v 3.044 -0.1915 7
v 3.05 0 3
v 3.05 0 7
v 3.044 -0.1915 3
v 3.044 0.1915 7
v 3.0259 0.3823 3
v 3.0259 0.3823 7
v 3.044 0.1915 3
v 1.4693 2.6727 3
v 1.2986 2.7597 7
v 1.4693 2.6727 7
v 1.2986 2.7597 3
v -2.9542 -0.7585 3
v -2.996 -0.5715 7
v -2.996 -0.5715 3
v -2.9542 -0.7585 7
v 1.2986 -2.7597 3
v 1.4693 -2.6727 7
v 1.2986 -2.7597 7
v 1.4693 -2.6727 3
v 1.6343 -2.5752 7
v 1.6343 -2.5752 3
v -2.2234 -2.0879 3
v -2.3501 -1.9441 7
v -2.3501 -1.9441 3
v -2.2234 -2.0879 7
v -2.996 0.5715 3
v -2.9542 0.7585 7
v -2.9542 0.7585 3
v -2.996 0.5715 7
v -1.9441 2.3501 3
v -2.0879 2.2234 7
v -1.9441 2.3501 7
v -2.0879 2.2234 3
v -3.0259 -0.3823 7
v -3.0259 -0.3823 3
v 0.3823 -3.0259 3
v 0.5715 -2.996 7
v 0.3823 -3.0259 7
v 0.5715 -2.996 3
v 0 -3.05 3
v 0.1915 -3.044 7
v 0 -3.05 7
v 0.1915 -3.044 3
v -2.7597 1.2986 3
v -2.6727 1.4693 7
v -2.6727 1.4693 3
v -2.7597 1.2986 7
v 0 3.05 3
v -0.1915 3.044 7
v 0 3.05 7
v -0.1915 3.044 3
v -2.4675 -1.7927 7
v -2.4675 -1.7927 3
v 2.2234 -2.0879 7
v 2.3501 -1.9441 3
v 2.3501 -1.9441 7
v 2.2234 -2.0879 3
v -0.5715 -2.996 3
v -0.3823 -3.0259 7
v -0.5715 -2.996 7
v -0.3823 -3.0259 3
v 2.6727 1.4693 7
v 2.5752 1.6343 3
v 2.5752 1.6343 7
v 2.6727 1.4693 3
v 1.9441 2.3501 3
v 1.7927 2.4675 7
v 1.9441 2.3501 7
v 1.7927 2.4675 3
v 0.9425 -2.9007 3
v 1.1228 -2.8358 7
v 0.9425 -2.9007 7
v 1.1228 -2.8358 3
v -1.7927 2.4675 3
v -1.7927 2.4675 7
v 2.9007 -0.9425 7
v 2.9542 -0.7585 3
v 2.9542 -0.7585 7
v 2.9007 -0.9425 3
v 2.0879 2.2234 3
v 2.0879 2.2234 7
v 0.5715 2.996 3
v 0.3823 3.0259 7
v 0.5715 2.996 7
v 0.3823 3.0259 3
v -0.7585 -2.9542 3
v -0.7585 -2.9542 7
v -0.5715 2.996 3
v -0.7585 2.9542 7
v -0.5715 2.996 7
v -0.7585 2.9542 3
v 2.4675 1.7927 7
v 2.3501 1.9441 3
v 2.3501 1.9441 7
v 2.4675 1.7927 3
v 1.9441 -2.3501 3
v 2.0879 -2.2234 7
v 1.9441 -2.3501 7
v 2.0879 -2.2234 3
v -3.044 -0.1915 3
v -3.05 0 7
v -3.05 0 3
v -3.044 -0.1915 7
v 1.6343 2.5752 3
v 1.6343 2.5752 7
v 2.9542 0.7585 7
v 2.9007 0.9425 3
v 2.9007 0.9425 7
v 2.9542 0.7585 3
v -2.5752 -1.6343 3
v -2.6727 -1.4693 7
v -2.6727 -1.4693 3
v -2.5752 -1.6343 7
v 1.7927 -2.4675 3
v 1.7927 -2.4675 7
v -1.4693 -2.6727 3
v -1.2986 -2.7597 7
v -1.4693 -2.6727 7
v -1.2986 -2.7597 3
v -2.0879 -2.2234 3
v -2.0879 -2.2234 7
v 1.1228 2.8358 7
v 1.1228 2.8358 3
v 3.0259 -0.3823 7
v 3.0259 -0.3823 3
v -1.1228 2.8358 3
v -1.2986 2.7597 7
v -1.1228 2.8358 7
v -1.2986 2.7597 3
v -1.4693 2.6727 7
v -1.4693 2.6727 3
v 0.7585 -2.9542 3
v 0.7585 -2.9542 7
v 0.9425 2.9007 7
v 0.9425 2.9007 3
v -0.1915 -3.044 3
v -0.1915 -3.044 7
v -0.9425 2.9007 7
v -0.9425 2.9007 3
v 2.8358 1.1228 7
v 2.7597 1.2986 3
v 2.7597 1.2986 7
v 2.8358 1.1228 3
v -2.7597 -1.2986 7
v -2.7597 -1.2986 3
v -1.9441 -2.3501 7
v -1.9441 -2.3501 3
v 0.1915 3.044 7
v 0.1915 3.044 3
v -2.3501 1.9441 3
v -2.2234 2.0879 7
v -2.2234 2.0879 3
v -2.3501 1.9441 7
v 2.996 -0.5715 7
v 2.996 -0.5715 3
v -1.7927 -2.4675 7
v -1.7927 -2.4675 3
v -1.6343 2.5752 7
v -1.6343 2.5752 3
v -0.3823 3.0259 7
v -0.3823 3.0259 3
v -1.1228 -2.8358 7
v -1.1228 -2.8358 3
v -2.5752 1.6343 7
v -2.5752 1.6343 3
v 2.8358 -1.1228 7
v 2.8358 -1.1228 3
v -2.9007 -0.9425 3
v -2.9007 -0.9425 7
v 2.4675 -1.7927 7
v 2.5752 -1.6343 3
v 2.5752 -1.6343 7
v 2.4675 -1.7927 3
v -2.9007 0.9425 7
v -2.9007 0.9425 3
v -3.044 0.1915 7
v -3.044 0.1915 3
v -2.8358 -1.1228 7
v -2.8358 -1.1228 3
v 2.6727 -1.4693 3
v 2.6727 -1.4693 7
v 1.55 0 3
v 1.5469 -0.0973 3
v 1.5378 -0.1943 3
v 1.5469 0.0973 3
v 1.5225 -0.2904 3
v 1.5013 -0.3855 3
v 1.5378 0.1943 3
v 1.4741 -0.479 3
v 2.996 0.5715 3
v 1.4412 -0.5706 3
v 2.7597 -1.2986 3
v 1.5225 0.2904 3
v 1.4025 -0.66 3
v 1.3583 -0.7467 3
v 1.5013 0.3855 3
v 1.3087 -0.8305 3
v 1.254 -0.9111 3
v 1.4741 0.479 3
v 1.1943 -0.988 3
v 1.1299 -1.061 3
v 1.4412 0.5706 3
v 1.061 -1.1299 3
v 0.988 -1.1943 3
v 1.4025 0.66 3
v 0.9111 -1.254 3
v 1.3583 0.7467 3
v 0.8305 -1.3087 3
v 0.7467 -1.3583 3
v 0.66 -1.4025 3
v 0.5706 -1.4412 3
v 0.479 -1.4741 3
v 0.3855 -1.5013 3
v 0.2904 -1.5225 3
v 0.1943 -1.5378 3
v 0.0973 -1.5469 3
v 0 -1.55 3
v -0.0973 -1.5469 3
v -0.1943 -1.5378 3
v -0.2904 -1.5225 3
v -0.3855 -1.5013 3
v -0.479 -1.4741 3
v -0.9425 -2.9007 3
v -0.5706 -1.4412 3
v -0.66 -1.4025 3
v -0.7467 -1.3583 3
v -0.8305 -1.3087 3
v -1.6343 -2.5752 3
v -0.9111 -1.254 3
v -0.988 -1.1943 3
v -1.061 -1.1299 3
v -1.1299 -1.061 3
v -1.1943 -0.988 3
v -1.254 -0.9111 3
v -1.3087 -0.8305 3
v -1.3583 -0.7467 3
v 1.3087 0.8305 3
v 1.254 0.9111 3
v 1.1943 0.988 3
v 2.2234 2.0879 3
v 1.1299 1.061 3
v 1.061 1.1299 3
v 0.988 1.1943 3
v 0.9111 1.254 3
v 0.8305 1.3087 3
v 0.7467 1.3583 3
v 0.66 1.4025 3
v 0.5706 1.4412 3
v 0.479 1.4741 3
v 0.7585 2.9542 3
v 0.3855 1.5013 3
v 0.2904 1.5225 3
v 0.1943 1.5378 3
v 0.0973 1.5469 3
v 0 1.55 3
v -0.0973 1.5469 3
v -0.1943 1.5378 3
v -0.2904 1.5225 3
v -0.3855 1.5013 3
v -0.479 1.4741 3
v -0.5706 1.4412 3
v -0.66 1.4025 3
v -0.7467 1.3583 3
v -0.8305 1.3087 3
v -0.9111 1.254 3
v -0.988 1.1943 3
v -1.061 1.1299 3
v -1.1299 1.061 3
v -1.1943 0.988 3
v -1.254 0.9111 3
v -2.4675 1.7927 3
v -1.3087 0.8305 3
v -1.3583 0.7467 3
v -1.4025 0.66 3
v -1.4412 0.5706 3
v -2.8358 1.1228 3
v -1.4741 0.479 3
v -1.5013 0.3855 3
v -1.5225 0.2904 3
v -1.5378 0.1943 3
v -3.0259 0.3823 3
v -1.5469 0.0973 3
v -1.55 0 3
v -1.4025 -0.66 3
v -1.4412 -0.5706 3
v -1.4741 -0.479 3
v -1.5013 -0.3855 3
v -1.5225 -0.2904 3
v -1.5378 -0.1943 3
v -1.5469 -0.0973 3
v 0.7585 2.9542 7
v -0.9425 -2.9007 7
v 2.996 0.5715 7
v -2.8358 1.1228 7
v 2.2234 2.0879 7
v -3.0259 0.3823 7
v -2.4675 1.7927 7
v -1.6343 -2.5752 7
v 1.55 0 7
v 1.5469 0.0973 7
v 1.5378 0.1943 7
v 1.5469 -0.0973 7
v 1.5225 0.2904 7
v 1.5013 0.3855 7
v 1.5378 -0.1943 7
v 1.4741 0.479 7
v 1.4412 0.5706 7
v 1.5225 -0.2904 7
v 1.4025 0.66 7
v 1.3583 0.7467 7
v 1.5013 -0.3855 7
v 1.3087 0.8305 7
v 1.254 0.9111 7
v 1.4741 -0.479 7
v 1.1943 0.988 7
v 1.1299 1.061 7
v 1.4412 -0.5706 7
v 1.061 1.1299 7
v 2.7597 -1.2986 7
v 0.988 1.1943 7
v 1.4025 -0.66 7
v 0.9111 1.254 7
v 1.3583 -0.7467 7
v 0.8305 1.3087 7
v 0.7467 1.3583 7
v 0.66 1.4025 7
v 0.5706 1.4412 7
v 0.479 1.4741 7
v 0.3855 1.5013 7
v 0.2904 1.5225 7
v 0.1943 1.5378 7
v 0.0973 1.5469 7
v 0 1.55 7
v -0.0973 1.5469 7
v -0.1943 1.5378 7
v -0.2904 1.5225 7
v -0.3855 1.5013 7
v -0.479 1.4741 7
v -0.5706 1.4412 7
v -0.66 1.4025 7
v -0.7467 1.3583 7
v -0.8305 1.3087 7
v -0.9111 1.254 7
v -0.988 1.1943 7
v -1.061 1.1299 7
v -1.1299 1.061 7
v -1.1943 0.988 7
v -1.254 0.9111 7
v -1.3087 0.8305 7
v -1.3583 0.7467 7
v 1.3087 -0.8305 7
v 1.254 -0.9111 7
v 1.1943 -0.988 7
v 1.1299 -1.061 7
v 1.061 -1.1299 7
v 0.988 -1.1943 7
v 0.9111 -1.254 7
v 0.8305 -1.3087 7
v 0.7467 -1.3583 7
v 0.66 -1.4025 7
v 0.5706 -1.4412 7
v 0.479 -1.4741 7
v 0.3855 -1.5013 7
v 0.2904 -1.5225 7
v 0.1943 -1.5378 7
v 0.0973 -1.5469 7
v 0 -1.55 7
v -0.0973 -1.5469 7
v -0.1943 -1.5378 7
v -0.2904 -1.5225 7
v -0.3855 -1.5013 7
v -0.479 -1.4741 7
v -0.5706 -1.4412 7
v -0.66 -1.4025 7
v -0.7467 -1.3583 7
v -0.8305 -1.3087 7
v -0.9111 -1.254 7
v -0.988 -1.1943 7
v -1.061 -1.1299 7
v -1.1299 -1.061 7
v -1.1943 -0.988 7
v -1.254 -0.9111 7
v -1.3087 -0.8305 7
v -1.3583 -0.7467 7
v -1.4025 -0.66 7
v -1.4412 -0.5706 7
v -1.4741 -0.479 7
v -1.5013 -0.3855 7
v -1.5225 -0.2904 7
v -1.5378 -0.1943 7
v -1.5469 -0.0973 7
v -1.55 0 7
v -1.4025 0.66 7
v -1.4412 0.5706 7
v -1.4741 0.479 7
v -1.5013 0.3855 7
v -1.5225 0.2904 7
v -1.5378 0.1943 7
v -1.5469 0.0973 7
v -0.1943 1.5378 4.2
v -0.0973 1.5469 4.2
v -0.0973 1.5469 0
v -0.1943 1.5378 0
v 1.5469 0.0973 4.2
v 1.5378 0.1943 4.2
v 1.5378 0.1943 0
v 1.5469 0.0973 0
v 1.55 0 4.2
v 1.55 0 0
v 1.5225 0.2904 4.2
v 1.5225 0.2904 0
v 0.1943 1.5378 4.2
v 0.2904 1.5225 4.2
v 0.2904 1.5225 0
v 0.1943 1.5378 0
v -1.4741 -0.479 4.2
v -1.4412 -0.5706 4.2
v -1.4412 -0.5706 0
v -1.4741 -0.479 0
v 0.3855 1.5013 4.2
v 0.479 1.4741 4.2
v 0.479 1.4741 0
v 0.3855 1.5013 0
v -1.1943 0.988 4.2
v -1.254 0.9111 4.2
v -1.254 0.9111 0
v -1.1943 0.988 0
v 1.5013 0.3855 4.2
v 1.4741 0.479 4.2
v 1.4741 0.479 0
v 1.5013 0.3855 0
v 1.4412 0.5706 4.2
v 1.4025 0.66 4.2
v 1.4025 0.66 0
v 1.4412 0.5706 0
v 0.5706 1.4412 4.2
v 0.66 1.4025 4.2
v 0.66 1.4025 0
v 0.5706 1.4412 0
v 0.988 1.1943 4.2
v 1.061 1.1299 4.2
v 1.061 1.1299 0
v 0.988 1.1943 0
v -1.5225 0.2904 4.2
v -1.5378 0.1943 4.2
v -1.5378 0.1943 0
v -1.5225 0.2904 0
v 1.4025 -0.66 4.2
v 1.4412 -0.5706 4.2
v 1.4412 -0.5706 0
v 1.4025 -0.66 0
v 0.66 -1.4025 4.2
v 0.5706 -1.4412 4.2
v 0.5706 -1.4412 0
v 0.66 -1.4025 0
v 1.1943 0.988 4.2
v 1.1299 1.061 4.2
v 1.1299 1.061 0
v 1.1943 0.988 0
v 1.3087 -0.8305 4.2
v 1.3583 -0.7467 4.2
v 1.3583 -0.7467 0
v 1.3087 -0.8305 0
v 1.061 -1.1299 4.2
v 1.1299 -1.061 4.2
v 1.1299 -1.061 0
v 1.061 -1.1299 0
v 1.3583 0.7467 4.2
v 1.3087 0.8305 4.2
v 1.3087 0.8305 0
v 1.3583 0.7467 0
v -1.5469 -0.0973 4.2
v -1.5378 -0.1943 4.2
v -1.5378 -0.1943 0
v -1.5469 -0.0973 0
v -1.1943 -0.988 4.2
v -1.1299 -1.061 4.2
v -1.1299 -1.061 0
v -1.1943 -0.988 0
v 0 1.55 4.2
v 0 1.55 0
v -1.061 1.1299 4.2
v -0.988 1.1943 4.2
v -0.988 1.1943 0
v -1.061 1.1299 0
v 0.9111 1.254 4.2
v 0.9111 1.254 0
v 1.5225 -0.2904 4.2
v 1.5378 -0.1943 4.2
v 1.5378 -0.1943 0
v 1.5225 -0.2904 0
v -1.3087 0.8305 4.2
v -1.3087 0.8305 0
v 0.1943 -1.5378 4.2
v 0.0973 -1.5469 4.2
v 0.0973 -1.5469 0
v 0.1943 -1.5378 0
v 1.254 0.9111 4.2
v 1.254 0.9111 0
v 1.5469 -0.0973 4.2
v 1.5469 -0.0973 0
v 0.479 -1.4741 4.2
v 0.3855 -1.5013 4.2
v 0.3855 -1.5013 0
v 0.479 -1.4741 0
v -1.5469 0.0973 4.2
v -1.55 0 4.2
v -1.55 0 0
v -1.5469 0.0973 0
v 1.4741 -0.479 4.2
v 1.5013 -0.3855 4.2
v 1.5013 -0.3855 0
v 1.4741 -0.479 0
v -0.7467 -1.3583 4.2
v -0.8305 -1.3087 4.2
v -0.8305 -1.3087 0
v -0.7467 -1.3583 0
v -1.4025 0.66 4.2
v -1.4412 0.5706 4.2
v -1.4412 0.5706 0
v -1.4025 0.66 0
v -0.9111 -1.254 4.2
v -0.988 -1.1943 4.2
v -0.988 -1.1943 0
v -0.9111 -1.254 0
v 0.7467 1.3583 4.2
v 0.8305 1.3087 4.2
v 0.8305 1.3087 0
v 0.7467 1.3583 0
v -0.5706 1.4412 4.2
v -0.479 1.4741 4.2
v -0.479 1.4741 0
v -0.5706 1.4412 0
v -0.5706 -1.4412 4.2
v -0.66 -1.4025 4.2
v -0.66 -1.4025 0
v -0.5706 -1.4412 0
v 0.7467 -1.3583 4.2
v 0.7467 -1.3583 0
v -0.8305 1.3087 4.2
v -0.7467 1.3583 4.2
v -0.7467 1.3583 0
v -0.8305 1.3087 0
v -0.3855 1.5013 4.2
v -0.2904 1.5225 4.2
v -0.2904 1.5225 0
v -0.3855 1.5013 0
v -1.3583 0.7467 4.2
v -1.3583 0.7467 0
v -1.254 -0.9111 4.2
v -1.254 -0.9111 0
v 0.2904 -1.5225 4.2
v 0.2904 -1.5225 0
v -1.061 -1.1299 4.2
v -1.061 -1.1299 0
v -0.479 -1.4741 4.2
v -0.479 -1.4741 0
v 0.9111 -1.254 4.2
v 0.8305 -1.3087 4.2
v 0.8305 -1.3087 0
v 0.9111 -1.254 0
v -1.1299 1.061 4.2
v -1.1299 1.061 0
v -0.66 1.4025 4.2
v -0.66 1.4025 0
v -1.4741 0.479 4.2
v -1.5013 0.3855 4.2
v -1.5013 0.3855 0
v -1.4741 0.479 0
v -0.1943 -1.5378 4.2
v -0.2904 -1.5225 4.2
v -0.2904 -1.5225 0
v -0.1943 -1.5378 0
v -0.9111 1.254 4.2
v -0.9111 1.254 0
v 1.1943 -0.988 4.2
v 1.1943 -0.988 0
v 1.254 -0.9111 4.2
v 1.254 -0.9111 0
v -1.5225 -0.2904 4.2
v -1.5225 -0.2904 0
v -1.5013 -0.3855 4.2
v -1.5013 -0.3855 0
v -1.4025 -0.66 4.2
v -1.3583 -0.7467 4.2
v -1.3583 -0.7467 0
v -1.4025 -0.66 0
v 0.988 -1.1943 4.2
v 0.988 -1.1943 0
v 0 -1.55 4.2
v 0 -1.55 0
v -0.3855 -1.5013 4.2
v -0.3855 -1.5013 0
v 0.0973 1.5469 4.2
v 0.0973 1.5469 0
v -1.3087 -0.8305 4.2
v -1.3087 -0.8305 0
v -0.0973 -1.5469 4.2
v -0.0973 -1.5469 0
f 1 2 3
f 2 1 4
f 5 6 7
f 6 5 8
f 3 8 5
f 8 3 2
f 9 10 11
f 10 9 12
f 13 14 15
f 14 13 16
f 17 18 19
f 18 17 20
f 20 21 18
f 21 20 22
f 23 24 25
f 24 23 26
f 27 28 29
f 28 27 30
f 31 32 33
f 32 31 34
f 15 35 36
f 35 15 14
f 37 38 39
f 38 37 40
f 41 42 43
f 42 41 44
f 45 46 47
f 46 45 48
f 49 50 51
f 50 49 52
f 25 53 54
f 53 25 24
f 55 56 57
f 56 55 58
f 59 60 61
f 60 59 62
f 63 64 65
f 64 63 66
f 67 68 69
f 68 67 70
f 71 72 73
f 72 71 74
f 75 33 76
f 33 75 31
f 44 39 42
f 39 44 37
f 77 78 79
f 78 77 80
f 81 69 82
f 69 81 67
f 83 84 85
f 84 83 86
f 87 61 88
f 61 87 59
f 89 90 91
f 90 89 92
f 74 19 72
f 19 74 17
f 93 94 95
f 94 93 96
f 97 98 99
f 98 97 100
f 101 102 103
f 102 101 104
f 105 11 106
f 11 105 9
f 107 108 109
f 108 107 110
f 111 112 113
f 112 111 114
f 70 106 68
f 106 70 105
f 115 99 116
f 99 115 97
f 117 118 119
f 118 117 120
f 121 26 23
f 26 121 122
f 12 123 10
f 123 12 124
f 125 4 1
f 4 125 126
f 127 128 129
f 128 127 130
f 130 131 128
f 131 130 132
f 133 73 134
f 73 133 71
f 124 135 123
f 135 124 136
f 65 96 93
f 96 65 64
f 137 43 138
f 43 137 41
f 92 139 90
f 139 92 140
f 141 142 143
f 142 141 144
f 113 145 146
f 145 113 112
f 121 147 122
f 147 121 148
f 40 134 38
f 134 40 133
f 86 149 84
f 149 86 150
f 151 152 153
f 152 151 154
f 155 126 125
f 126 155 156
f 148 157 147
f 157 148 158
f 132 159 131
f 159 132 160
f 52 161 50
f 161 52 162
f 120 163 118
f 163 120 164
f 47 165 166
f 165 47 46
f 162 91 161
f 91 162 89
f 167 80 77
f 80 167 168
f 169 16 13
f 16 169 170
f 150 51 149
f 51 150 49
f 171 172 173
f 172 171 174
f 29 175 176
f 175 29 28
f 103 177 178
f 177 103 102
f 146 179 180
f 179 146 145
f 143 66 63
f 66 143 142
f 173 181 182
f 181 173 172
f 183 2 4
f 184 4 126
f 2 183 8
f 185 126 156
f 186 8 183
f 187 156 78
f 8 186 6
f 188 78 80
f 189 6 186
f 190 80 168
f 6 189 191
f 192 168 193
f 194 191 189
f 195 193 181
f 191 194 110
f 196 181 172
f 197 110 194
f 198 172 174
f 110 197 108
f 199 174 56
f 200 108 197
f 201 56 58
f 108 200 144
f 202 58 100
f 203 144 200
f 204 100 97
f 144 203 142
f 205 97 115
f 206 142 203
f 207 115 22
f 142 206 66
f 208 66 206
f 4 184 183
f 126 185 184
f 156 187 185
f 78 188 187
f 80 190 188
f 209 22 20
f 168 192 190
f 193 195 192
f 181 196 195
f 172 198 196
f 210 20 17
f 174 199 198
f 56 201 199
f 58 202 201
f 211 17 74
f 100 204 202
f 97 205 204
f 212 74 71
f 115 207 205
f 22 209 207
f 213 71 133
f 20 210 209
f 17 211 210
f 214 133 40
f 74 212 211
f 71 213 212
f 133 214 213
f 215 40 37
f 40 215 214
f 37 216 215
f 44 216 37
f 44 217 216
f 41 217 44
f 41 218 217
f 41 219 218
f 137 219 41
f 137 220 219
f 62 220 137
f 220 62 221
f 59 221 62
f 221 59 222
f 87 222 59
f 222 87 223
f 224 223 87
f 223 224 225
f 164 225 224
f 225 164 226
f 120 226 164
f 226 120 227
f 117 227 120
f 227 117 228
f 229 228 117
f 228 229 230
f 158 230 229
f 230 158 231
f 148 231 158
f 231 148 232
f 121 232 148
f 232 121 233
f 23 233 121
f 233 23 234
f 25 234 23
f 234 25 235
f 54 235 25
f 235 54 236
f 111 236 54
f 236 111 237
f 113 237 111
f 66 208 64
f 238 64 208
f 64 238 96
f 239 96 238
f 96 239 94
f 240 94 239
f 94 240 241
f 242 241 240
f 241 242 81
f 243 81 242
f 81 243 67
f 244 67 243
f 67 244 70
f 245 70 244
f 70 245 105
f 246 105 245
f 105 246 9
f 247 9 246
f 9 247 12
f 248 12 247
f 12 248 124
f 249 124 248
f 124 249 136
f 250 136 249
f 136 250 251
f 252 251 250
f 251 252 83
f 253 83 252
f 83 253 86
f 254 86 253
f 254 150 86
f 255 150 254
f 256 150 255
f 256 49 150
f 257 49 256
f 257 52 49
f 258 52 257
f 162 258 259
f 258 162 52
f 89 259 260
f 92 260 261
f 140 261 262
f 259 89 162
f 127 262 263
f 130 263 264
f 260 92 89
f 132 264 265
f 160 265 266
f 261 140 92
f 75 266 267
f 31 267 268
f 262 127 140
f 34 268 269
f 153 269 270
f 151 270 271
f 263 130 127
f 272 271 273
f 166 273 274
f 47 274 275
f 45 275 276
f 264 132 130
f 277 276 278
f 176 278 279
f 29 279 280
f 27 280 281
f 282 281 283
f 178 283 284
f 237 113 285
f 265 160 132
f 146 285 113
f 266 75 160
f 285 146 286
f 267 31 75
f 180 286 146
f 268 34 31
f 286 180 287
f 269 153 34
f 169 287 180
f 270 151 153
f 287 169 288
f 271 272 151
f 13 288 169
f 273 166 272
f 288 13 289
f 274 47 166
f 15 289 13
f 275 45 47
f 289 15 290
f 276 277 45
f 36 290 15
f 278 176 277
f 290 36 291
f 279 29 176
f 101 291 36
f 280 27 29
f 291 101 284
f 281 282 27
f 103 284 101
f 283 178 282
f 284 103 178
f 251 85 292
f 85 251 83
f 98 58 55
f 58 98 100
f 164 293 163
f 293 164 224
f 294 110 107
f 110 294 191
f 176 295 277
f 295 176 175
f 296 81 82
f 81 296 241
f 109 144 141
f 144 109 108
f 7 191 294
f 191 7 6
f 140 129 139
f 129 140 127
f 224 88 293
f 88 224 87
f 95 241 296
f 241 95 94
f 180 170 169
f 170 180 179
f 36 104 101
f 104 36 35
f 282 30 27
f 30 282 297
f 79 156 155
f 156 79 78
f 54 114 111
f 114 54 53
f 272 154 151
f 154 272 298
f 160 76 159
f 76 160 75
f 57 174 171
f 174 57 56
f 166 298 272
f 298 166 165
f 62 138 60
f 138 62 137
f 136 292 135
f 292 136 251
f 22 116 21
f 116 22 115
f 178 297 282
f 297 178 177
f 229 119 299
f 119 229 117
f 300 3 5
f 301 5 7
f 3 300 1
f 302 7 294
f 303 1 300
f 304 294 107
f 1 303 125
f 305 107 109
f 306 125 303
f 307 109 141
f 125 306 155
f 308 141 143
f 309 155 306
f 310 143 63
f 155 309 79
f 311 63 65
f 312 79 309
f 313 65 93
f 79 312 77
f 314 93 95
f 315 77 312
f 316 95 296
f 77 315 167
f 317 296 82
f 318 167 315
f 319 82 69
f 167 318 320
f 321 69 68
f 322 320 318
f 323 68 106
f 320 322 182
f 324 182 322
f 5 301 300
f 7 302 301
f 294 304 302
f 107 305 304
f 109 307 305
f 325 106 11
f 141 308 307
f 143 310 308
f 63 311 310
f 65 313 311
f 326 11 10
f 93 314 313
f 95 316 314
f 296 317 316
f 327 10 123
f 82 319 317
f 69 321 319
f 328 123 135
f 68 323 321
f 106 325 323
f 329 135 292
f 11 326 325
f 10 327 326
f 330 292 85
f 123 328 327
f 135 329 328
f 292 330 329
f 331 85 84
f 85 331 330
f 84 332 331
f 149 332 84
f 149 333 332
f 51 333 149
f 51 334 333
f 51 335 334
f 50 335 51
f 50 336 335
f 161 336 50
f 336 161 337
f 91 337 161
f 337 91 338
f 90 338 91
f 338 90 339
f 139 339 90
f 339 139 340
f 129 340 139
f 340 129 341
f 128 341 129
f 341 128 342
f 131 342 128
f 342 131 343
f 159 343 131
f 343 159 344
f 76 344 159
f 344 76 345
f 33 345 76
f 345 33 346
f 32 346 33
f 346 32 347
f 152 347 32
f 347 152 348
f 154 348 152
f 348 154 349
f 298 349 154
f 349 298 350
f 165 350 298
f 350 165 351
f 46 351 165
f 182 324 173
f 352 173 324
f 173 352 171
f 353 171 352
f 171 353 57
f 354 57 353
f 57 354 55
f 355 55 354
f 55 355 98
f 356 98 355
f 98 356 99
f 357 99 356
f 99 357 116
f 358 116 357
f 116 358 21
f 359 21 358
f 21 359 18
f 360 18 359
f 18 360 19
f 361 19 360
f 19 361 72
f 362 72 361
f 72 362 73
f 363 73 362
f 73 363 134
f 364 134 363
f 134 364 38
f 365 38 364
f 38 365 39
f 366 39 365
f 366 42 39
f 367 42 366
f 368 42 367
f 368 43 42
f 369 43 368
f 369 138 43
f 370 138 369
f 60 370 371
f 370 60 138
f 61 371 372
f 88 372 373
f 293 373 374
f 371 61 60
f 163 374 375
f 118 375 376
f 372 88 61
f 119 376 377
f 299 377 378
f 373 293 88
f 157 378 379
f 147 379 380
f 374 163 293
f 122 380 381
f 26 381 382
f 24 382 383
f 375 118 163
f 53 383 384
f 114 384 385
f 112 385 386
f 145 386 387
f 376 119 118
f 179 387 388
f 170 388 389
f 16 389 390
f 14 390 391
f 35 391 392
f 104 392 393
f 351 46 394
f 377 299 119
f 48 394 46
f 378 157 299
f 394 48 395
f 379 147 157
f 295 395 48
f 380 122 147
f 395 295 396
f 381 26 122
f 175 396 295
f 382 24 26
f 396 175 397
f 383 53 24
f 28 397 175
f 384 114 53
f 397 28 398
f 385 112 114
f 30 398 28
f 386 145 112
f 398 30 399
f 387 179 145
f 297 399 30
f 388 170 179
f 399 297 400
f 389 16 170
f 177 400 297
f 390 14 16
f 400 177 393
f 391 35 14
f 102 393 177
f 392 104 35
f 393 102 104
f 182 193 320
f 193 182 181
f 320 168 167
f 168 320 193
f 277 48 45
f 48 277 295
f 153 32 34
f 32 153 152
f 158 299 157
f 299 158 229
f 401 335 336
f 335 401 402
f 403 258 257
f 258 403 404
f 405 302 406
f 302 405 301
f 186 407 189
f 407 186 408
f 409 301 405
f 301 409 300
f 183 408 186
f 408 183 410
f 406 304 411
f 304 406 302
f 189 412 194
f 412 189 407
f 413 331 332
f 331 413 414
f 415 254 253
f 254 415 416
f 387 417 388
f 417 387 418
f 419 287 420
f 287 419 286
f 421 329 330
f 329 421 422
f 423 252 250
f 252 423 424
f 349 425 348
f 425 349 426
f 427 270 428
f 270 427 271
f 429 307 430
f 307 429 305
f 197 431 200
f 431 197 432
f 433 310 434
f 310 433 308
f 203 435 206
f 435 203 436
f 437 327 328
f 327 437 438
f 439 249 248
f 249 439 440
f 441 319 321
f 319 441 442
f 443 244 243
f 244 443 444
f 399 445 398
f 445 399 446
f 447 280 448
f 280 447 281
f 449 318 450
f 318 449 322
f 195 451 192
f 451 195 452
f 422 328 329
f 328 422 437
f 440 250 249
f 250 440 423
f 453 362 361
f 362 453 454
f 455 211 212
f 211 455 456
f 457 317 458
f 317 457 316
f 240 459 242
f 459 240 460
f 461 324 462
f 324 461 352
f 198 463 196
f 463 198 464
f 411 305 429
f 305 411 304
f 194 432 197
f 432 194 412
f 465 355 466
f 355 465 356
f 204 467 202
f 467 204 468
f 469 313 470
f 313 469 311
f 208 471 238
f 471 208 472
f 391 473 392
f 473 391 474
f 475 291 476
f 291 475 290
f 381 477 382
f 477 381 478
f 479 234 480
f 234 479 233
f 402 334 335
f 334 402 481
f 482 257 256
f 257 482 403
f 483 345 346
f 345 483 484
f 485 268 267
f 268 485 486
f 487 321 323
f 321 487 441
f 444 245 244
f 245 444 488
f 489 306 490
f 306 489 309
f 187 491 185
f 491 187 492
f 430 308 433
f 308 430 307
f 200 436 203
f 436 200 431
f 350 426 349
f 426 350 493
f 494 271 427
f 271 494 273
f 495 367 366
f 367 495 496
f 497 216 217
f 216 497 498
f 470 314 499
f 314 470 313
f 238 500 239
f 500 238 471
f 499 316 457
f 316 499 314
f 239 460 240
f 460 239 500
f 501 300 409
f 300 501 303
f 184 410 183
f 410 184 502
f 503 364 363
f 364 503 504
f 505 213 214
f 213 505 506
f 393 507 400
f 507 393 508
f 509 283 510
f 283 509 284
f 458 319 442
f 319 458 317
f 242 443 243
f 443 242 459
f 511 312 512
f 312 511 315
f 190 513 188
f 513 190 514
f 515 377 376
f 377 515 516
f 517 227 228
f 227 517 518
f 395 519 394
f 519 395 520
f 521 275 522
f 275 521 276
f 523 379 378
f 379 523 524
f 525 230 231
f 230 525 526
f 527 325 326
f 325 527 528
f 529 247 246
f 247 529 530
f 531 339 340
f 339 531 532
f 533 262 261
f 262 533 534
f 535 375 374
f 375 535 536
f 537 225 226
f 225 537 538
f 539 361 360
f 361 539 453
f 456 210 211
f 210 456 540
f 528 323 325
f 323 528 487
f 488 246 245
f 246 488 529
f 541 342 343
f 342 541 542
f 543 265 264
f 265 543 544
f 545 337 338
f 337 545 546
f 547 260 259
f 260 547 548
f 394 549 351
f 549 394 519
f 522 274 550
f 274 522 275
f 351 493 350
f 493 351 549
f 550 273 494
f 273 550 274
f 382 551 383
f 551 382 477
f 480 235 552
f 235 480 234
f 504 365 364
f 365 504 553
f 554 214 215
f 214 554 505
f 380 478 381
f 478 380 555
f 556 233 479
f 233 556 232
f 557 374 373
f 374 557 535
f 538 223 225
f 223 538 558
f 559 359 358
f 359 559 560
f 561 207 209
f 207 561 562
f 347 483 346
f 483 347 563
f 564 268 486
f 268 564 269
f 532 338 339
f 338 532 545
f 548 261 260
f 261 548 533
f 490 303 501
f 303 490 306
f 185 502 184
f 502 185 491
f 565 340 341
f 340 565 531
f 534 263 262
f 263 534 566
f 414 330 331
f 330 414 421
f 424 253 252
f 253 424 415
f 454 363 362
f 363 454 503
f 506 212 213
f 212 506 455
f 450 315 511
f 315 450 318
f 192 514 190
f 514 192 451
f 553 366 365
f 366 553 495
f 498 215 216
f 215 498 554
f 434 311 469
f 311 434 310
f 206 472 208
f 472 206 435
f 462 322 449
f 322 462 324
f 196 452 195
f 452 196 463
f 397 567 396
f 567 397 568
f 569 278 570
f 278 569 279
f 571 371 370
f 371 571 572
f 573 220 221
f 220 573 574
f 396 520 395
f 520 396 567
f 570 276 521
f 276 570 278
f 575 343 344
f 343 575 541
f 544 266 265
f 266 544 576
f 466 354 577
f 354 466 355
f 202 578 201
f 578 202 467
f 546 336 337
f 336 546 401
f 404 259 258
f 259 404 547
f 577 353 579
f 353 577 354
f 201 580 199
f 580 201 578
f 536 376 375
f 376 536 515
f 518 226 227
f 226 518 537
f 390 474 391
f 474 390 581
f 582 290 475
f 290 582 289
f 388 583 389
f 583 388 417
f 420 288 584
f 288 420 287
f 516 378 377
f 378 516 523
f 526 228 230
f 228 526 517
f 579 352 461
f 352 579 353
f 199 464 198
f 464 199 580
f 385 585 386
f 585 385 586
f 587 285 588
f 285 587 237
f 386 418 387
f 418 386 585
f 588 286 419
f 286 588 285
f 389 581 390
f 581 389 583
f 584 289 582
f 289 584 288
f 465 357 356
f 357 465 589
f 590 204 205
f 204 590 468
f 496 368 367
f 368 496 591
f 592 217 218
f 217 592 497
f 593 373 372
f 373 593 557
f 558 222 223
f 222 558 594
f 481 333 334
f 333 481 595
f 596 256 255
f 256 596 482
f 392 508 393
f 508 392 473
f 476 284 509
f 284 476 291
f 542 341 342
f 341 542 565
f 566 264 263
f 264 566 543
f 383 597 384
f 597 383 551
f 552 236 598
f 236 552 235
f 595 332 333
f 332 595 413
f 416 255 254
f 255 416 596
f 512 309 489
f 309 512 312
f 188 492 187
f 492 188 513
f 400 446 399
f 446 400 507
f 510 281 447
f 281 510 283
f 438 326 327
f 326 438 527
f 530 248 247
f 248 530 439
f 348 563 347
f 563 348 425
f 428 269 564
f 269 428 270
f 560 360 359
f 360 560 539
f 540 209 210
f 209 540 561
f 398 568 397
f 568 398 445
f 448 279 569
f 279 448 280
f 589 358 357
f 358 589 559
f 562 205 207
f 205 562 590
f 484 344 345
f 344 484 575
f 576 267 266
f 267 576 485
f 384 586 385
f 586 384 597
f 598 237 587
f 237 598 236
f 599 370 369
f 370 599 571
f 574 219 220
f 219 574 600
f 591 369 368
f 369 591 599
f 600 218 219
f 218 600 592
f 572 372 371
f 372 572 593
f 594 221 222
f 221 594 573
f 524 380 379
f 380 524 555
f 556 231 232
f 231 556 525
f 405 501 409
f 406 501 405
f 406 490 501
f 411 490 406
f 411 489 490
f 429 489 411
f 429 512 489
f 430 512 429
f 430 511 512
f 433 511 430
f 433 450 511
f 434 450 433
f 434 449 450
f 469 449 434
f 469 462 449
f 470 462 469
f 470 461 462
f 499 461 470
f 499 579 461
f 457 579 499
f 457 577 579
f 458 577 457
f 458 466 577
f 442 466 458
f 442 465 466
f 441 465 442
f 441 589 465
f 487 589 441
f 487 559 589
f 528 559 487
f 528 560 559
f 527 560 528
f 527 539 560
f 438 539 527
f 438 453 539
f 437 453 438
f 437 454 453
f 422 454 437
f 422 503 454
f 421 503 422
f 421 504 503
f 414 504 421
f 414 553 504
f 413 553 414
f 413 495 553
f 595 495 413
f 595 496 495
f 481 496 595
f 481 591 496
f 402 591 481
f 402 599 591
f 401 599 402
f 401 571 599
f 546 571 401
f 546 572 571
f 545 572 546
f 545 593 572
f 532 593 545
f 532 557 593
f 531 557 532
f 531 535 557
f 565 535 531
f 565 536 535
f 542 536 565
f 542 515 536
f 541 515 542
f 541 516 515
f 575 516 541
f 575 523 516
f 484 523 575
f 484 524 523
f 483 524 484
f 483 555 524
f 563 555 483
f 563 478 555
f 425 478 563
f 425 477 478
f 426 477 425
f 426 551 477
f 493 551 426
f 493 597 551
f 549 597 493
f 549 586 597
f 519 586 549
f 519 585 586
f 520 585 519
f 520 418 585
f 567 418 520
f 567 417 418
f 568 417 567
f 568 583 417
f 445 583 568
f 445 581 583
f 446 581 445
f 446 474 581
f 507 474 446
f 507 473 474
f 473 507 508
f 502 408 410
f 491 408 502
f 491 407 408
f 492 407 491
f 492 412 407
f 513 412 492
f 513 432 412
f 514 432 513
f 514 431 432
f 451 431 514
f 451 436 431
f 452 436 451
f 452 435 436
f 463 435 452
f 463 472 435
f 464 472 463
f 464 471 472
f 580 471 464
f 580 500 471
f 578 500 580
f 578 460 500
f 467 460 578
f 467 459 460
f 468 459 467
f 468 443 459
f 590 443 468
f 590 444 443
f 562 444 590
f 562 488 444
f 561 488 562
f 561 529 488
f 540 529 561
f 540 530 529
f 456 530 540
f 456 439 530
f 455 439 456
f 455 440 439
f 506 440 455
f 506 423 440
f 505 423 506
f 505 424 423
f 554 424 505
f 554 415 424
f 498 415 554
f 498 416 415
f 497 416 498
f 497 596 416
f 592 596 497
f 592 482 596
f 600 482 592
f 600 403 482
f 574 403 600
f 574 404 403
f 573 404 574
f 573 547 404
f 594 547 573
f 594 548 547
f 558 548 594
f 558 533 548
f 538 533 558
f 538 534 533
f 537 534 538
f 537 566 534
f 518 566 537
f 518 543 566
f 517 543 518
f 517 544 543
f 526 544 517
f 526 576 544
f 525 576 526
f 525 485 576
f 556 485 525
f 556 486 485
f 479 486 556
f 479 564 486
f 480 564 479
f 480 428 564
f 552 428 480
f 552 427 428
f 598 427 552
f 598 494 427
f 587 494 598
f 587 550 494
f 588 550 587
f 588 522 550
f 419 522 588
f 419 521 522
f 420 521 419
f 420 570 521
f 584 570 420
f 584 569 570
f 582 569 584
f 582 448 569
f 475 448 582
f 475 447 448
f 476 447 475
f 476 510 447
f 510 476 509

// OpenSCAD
THICKNESS=3;
REFLECTOR_THICKNESS=2;
SCREEN=0.2;

module led_holder(r=10,h=10,thickness=3,reflector_thickness=2,silksreen=0.2) {
    translate([0,0,h/2+thickness]) {
        difference() {
            cylinder(r=r+thickness/2,h=h, center=true, $fn=100);
            cylinder(r=r,h=h, center=true, $fn=100);
        }    
    }
}    
module led_hole(r=10,h=10,thickness=3,reflector_thickness=2,silksreen=0.2) {
    translate([0,0,h/2+silksreen]) cylinder(r=r,h=h, center=true, $fn=100);
}

module led_silk(r=10,h=10,thickness=3,reflector_thickness=2,silksreen=0.2) {
    color("red") translate([0,0,silksreen/2]) cylinder(r=r,h=silksreen, center=true, $fn=100);
}

color("red") led_holder(r=1.55,h=4,silksreen=SCREEN,thickness=THICKNESS,reflector_thickness=REFLECTOR_THICKNESS);
color("green") led_hole(r=1.55,h=4,silksreen=SCREEN,thickness=THICKNESS,reflector_thickness=REFLECTOR_THICKNESS);
color("yellow") led_silk(r=1.55,h=4,silksreen=SCREEN,thickness=THICKNESS,reflector_thickness=REFLECTOR_THICKNESS);

 
